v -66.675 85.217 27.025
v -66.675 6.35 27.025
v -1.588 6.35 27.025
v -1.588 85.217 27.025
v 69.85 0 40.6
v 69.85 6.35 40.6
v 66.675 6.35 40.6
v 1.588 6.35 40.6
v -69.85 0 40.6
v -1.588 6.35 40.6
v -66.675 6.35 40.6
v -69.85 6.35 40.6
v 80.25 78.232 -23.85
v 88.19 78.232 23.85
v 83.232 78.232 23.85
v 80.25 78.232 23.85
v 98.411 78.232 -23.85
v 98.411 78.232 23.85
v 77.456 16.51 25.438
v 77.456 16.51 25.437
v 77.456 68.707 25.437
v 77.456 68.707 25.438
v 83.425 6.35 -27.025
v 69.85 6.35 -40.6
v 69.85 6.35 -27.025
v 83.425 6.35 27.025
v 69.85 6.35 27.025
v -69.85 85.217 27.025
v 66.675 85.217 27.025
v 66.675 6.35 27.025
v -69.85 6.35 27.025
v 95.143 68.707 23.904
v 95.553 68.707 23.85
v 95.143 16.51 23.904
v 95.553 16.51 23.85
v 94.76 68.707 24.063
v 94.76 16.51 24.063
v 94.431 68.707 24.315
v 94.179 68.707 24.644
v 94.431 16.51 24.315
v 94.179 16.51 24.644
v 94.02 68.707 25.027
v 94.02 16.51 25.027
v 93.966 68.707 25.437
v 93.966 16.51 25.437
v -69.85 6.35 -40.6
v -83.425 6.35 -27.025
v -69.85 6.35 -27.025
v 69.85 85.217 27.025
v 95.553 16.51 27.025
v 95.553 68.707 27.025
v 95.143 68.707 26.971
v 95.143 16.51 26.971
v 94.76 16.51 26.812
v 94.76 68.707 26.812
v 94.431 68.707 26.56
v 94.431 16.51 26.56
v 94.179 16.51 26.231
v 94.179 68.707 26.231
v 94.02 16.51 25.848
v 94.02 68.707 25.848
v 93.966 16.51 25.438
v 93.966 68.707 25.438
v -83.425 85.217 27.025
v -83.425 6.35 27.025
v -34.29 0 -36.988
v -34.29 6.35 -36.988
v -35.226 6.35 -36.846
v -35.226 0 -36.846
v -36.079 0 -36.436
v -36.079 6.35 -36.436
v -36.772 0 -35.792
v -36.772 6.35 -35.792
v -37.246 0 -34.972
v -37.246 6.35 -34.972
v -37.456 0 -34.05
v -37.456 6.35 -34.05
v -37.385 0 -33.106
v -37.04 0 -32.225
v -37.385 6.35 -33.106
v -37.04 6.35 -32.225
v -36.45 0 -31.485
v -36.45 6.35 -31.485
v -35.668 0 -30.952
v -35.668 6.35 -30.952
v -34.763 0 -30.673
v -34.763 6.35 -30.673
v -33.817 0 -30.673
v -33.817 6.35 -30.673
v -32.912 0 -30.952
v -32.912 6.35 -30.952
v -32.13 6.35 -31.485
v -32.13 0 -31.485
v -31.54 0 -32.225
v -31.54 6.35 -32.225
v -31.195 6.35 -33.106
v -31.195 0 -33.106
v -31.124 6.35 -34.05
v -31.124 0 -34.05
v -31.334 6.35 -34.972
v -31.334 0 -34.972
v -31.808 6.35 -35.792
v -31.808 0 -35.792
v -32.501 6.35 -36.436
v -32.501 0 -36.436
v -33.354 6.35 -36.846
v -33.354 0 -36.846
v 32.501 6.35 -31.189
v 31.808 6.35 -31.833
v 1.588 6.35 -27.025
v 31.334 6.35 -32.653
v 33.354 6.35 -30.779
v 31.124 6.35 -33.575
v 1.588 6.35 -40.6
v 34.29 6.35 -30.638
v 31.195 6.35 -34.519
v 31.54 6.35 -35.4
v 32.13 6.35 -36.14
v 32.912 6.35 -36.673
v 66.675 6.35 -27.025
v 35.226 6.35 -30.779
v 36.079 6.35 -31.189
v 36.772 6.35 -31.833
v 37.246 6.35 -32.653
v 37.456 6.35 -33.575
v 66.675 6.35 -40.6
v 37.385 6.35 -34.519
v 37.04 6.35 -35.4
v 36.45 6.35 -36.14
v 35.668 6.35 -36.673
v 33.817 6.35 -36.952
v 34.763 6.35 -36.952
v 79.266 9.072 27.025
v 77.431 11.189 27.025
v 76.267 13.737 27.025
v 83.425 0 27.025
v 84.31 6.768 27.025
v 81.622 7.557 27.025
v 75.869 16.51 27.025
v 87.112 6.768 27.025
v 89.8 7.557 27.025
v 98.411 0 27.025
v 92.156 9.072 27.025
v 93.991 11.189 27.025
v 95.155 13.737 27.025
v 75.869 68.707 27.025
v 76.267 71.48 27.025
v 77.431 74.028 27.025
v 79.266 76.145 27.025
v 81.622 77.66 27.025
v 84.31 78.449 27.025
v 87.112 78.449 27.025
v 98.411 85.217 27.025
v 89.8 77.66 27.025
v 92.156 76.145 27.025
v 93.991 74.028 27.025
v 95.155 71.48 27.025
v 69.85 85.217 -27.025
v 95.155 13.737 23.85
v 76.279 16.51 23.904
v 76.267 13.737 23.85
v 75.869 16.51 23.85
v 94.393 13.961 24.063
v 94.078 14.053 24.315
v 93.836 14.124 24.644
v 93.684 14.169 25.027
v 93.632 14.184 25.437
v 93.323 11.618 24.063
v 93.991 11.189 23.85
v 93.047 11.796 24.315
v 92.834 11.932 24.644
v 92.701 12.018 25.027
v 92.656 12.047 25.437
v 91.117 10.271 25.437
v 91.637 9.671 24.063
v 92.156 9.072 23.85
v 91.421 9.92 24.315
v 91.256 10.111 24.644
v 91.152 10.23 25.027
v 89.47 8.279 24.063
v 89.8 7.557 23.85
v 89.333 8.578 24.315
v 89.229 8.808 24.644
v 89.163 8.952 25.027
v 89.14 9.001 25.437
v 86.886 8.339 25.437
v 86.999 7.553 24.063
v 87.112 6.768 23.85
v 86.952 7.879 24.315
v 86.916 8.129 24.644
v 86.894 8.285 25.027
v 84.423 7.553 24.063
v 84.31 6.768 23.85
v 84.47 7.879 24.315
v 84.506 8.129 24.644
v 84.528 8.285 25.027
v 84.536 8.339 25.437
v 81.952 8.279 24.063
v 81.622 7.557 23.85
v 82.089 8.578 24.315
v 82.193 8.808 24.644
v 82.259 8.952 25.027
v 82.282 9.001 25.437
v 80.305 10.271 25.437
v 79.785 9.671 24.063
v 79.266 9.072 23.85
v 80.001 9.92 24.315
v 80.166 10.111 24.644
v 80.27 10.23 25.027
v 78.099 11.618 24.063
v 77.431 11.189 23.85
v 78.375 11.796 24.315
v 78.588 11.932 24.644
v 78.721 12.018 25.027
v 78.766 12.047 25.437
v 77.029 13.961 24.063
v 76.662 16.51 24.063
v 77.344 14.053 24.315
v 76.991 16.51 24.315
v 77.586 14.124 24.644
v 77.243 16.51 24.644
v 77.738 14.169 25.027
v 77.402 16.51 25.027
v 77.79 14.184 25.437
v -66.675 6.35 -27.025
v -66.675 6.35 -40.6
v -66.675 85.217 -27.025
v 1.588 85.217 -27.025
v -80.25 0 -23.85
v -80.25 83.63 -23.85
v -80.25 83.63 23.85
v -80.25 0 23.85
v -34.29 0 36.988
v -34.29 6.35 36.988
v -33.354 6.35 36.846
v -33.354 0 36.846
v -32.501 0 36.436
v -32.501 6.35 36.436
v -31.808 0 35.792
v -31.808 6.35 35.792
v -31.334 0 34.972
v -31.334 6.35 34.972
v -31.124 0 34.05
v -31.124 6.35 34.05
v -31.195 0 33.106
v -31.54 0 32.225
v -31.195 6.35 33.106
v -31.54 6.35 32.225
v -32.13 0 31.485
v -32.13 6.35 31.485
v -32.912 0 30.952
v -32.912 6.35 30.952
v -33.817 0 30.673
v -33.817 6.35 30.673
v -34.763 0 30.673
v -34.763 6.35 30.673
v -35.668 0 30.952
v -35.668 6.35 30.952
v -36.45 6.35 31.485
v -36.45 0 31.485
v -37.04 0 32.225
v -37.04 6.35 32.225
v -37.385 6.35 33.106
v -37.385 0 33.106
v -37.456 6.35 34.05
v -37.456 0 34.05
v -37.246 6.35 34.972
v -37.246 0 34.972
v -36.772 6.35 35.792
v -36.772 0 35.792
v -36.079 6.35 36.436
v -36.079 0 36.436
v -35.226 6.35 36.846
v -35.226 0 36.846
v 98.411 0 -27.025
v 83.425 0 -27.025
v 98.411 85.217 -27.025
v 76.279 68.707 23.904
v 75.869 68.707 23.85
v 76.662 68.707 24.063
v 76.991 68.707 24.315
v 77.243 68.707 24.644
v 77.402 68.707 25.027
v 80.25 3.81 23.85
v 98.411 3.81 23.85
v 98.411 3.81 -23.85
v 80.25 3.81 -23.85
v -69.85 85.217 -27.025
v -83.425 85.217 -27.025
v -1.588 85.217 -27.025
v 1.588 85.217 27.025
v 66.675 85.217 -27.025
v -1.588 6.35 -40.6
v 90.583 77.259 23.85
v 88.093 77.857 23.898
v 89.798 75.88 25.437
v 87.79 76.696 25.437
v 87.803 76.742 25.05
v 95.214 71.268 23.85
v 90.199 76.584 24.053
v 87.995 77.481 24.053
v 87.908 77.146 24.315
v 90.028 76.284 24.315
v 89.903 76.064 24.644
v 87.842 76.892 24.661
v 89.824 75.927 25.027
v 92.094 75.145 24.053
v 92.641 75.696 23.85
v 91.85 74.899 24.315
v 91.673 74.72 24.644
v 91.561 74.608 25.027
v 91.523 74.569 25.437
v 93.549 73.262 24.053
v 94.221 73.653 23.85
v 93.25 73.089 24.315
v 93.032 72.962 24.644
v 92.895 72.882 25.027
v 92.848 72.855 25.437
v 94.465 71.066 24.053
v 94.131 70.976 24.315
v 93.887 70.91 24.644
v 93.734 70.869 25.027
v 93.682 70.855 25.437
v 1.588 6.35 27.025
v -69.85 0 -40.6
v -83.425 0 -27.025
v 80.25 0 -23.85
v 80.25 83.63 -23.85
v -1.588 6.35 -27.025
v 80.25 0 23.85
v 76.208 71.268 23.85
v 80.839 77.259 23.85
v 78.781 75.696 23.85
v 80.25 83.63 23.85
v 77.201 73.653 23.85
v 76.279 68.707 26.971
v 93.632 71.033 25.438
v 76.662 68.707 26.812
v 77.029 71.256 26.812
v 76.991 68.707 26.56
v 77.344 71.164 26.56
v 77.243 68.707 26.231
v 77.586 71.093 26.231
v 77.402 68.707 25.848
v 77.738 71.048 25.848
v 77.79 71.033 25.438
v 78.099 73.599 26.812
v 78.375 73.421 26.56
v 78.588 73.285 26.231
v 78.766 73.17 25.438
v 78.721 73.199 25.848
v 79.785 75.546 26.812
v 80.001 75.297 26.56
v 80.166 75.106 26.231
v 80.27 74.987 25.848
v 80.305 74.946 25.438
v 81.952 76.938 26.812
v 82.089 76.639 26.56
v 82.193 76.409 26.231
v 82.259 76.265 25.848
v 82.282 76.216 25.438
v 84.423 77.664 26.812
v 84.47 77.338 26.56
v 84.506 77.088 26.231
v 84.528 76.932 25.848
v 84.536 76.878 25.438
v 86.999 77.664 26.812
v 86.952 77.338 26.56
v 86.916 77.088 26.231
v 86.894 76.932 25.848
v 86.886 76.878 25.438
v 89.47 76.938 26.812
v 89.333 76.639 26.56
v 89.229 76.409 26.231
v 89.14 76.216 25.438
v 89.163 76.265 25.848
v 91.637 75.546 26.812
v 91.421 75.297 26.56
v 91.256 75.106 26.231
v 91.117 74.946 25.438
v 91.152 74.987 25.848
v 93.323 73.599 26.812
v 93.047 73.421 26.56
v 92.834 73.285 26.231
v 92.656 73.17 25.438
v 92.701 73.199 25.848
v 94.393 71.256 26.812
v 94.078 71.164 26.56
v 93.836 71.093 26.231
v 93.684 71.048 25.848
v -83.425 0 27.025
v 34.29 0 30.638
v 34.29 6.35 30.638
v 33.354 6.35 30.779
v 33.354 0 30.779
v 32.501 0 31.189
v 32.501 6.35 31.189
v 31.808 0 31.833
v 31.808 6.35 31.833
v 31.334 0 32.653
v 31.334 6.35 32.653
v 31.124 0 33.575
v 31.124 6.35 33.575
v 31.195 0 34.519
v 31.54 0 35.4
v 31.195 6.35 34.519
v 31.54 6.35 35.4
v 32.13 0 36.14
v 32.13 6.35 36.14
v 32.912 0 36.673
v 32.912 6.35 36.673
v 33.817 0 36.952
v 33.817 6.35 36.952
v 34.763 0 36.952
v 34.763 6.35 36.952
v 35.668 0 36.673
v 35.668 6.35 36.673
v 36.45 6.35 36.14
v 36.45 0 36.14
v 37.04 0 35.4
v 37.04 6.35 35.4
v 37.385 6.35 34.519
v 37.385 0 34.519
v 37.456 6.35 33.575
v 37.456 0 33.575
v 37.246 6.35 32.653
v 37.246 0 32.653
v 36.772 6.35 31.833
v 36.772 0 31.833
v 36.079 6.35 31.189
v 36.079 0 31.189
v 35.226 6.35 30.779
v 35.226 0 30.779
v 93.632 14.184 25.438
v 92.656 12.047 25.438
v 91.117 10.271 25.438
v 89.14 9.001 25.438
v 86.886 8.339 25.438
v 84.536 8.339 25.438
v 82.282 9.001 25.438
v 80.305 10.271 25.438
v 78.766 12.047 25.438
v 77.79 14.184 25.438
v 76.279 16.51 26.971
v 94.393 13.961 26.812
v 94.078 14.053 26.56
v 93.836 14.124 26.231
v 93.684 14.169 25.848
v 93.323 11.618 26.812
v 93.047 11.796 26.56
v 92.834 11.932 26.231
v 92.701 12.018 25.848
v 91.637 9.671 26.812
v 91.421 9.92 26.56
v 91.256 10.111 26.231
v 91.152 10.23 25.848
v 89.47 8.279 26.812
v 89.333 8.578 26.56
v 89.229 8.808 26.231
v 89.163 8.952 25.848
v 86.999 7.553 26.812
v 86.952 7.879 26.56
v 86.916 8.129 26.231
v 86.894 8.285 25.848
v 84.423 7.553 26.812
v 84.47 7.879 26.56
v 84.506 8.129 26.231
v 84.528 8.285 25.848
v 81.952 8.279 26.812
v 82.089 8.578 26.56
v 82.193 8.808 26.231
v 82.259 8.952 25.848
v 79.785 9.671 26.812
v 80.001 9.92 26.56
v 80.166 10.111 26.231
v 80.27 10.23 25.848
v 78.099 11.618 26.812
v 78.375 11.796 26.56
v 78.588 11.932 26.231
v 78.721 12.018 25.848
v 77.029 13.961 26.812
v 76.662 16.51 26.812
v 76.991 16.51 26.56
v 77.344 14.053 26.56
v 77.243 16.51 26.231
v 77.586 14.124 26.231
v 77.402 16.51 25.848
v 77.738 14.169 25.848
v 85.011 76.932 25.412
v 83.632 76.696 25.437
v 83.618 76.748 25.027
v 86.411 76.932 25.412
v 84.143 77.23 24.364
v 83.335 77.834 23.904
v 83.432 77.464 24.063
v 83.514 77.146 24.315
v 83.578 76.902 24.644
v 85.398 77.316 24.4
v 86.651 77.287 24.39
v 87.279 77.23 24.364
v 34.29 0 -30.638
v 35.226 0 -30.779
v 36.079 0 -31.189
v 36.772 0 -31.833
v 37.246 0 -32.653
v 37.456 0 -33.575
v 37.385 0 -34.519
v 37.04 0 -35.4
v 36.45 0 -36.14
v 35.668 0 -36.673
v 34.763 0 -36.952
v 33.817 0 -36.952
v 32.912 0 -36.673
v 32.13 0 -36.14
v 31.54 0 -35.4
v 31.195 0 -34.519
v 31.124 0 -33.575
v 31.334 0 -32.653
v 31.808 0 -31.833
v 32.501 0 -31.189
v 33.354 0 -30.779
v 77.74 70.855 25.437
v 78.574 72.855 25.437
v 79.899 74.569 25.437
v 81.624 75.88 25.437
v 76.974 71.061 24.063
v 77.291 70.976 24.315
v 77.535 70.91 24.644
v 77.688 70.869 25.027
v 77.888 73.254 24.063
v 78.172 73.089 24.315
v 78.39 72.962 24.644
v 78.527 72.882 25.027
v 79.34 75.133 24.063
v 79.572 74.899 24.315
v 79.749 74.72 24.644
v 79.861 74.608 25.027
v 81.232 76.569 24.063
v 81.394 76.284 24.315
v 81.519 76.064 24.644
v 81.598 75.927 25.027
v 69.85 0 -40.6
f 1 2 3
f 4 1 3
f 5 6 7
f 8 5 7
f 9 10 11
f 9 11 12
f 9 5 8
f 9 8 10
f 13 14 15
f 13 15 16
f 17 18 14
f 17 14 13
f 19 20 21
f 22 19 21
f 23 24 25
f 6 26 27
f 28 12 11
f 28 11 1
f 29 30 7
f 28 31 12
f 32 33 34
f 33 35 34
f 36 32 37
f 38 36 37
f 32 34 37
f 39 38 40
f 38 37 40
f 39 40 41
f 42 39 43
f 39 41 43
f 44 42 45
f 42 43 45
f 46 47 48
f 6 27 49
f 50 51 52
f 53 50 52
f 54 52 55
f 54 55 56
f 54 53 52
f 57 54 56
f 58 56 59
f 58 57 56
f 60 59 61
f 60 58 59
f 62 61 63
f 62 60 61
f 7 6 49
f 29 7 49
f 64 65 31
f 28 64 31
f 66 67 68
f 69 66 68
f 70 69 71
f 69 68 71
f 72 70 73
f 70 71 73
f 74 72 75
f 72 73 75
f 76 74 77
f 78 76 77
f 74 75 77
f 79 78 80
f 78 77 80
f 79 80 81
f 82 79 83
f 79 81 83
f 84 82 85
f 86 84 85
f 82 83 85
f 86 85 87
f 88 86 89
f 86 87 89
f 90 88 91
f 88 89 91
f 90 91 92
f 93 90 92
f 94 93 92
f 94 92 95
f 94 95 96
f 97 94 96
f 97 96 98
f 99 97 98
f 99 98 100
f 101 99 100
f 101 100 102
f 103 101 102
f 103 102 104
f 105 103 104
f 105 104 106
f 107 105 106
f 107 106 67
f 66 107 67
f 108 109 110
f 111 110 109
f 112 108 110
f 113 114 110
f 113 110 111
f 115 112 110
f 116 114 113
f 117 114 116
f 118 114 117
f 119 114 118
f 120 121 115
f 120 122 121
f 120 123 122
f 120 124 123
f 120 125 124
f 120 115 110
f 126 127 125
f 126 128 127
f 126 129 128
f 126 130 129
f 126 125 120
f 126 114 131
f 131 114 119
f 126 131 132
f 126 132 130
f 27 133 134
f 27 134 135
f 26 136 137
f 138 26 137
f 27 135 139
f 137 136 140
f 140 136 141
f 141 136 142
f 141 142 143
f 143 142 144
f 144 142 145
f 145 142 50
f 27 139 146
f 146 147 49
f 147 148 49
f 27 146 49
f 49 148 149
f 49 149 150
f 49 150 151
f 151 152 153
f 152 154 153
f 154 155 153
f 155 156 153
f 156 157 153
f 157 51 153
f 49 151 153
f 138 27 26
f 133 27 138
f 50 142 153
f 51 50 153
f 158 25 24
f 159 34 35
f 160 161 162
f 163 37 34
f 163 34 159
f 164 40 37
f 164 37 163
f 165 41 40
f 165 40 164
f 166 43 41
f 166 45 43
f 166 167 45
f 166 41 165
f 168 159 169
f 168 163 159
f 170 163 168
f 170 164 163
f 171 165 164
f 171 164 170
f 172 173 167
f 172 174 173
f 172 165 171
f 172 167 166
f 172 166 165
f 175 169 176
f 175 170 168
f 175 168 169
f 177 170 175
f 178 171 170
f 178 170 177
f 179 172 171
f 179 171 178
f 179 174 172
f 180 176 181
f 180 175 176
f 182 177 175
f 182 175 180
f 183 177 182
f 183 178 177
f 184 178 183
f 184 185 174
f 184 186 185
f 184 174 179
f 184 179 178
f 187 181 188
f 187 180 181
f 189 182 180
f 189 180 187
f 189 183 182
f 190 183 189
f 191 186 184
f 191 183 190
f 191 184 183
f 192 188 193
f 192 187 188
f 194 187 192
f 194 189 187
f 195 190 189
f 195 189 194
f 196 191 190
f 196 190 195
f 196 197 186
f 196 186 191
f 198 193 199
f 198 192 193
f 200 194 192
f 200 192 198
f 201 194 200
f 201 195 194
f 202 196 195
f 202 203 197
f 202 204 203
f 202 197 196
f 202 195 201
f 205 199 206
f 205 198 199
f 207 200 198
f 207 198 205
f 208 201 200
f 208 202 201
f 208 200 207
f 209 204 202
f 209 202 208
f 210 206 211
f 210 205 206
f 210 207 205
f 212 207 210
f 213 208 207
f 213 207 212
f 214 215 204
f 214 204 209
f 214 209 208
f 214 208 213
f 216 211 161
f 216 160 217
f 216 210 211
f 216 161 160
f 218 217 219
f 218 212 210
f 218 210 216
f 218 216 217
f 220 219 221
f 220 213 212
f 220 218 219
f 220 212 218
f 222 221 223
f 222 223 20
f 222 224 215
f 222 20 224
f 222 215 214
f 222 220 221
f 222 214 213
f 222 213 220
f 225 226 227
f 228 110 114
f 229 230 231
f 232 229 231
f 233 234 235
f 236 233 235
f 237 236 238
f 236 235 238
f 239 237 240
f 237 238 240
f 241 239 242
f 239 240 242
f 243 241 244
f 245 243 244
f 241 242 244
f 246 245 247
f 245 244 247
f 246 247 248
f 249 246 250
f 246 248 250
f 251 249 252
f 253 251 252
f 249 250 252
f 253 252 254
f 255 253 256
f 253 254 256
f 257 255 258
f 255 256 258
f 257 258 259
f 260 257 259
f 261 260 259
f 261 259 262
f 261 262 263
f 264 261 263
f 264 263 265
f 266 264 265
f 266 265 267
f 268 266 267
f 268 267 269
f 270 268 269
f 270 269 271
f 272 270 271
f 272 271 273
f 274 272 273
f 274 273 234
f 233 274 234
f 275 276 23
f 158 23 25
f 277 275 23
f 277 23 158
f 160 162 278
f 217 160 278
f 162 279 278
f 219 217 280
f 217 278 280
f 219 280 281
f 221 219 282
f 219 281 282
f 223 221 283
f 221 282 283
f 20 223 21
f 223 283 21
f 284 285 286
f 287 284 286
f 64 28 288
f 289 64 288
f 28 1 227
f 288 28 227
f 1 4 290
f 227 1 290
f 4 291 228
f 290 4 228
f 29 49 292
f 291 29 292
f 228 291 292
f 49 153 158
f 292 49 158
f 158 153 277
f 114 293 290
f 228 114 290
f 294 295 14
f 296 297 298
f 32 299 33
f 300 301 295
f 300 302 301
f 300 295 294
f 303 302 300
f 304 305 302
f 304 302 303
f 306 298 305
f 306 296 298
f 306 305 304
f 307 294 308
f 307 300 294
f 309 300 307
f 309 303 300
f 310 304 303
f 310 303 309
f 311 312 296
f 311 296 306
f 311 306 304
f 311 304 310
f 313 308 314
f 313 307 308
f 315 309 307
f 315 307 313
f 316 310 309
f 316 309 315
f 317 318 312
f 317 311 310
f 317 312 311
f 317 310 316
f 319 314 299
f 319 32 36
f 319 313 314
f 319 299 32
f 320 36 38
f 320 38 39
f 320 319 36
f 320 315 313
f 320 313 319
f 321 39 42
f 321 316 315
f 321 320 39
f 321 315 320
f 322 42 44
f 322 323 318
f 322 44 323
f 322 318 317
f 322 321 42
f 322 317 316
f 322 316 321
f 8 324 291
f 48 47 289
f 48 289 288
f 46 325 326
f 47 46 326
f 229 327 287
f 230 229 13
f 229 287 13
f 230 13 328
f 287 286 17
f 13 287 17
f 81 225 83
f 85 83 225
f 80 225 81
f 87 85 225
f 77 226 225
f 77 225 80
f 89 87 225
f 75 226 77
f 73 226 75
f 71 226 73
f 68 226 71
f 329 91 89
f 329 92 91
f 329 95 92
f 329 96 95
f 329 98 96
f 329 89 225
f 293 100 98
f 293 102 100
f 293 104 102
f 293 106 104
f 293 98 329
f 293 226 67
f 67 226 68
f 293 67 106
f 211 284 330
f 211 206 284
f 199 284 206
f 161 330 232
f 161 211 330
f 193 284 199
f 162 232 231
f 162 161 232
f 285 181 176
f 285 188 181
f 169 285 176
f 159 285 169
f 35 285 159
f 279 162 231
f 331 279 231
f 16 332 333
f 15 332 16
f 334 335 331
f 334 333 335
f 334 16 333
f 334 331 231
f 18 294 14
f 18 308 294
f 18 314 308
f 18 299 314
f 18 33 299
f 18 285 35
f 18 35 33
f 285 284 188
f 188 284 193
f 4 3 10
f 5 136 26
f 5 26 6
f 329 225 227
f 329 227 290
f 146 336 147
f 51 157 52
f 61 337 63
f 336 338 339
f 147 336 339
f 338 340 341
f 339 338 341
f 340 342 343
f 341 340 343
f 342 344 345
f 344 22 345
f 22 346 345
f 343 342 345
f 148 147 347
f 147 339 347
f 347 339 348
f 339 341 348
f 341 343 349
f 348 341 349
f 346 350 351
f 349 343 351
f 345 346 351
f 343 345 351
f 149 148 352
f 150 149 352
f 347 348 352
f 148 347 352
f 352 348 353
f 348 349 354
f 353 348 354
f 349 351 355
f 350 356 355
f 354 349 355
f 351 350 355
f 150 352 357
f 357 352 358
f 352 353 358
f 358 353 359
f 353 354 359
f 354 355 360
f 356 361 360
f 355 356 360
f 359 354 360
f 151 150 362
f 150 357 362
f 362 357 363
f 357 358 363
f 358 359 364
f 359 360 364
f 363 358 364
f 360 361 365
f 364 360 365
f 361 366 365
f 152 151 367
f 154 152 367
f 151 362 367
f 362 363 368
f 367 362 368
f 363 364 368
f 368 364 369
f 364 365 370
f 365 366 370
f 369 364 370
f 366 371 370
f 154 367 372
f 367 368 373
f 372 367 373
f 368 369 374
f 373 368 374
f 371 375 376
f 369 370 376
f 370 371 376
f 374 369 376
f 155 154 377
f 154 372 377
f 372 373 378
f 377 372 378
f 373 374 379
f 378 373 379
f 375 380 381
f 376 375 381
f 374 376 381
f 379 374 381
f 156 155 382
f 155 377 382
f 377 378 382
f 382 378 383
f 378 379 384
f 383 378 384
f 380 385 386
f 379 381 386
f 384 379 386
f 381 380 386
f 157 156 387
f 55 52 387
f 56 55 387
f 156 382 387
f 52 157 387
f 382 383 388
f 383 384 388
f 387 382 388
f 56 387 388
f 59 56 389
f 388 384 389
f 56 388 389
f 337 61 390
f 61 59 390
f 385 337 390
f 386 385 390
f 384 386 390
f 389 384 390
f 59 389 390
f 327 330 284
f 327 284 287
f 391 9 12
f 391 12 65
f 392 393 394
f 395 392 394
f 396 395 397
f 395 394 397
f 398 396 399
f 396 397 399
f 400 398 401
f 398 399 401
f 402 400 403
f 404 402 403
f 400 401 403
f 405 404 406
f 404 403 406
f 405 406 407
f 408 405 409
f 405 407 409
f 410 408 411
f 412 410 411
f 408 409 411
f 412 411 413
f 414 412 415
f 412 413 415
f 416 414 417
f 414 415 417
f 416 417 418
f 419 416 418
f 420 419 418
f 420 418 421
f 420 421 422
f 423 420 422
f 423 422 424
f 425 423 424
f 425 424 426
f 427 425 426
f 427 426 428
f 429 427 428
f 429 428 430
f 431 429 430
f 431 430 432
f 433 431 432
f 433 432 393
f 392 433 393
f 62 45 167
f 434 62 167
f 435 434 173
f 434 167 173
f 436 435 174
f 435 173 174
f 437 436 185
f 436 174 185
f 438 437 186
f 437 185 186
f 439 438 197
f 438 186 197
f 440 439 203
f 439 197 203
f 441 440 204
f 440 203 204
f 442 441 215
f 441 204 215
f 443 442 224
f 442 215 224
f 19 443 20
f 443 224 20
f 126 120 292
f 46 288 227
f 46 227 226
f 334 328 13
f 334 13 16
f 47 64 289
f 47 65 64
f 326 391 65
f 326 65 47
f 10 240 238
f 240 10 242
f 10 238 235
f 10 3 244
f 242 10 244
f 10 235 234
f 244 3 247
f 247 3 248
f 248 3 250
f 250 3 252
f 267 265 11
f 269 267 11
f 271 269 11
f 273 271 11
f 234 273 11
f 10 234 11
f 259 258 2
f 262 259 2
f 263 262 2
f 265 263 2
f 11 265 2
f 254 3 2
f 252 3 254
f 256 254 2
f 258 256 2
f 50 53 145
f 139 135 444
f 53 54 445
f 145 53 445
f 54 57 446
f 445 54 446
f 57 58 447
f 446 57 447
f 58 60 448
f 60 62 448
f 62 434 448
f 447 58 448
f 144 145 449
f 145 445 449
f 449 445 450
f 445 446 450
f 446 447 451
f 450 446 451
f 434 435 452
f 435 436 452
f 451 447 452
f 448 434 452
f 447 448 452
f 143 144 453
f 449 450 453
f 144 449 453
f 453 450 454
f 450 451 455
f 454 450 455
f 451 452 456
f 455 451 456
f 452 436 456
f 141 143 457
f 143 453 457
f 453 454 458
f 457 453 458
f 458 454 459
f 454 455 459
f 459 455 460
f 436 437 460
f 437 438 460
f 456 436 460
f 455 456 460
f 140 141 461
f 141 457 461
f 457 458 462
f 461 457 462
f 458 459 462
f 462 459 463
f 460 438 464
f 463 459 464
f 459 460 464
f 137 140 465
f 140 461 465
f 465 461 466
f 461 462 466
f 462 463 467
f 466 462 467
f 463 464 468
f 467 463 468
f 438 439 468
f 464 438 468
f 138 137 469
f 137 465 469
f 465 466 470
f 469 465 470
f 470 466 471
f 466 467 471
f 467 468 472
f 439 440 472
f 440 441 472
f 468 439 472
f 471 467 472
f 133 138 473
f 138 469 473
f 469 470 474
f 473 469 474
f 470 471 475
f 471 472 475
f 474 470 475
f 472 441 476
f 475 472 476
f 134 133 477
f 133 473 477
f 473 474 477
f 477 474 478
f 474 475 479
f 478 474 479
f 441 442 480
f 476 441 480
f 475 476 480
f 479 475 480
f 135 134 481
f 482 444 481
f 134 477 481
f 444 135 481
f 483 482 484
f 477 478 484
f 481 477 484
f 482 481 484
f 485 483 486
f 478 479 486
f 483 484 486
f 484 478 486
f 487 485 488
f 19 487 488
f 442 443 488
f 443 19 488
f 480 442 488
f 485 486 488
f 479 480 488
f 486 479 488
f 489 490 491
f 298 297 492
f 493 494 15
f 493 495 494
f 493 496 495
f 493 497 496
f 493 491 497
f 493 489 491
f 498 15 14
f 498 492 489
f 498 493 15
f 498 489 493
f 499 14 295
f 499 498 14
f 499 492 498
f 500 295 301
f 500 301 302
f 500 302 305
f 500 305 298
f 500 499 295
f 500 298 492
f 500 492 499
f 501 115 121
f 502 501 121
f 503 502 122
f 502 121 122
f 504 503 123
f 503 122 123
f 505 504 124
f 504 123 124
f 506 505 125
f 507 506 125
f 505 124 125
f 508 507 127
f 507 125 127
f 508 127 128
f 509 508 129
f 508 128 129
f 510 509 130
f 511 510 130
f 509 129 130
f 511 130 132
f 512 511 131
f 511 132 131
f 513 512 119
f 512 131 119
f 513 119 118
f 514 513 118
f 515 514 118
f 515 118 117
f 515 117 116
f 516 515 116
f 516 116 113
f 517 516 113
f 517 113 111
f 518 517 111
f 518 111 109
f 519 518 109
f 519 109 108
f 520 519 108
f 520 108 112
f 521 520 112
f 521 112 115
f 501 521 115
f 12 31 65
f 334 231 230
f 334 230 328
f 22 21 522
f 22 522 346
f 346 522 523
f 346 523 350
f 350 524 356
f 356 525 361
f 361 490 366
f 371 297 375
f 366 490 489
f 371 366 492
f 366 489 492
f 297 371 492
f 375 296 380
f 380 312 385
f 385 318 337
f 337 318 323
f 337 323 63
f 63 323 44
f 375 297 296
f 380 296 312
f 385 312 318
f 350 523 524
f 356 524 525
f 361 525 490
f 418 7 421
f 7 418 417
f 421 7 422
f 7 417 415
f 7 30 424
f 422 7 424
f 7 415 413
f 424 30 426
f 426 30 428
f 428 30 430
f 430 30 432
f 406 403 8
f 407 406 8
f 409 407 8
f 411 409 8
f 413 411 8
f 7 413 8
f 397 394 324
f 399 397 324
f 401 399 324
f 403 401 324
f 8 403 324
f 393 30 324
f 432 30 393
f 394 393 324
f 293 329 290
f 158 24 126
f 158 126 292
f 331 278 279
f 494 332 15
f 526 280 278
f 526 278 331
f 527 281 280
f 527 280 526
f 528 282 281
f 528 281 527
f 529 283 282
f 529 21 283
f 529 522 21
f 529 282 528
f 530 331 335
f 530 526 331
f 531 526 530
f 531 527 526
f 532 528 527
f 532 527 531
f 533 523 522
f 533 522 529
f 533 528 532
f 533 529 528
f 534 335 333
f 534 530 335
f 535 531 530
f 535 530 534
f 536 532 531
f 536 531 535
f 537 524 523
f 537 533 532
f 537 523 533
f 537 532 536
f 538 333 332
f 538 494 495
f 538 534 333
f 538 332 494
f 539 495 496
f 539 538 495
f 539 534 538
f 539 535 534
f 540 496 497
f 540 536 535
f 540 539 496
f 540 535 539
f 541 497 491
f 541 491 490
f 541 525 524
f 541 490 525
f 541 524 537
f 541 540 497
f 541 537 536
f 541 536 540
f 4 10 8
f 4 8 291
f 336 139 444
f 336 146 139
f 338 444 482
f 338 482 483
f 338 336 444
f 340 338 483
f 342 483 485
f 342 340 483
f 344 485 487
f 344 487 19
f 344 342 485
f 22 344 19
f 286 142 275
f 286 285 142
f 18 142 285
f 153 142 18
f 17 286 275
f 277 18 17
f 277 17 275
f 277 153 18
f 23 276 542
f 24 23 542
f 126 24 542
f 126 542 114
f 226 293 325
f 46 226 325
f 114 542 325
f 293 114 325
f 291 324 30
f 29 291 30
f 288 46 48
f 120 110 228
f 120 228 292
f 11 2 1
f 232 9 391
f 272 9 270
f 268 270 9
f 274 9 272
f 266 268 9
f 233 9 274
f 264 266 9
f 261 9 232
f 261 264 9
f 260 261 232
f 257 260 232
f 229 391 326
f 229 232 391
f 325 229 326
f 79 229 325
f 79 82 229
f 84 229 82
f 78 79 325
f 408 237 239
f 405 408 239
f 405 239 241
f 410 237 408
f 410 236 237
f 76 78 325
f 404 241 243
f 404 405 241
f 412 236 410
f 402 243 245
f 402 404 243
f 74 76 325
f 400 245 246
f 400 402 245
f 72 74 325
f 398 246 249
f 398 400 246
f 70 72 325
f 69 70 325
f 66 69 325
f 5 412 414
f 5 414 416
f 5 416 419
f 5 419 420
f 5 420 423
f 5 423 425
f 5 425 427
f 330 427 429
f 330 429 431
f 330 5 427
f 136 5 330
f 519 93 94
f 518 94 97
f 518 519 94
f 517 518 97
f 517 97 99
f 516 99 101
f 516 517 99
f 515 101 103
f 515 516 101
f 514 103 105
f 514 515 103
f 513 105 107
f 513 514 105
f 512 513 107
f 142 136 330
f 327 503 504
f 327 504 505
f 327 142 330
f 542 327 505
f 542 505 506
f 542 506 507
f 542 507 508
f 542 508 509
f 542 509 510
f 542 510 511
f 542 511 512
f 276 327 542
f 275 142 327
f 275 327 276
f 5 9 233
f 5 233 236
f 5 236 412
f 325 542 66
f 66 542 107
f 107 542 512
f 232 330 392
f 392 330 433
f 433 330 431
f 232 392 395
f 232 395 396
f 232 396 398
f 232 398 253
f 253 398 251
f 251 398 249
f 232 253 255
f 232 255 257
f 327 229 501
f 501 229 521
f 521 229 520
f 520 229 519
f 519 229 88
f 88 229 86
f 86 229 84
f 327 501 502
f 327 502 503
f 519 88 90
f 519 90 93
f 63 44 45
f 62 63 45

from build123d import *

# Parameters (mm, degrees)
SKETCH1_W                 = 166.85
SKETCH1_H                 = 54.05
SKETCH1_W_2               = 160.5
SKETCH1_H_2               = 47.7
BOSS_EXTRUDE1_DEPTH       = 3.81
BOSS_EXTRUDE2_DEPTH       = 78.232
SKETCH3_W                 = 166.85
SKETCH3_H                 = 54.05
BOSS_EXTRUDE5_DEPTH       = 3.175
SKETCH4_W                 = 3.175
SKETCH4_H                 = 54.05
BOSS_EXTRUDE6_DEPTH       = 3.81
BOSS_EXTRUDE7_DEPTH       = 6.35
BOSS_EXTRUDE9_DEPTH       = 3.175
BOSS_EXTRUDE10_DEPTH      = 3.175
SKETCH8_R                 = 3.175
CUT_EXTRUDE1_DEPTH        = 122.77066278
BOSS_EXTRUDE11_DEPTH      = 1.5875
BOSS_EXTRUDE11_DEPTH_BACK = 1.5875
SKETCH14_W                = 54.05
SKETCH14_H                = 85.217
SKETCH14_W_2              = 47.7
SKETCH14_H_2              = 74.422
BOSS_EXTRUDE13_DEPTH      = 14.986
CUT_EXTRUDE2_DEPTH        = 147.696293869
SKETCH16_W                = 160.5
SKETCH16_H                = 47.7
CUT_EXTRUDE3_DEPTH        = 1.5875
SKETCH17_W                = 18.712657602
SKETCH17_H                = 69.277031054
BOSS_EXTRUDE14_DEPTH      = 3.175
FILLET1_R                 = 1.5875


with BuildPart() as part:
    # Sketch1 → Boss-Extrude1 (new body)
    with BuildSketch(Plane(origin=(0, 0, 0), x_dir=(1, 0, 0), z_dir=(0, 1, 0))):
        Rectangle(SKETCH1_W, SKETCH1_H)
        Rectangle(SKETCH1_W_2, SKETCH1_H_2, mode=Mode.SUBTRACT)
    extrude(amount=BOSS_EXTRUDE1_DEPTH)

    # Sketch2 → Boss-Extrude2 (add)
    with BuildSketch(Plane(origin=(0, 3.81, 0), x_dir=(1, 0, 0), z_dir=(0, 1, 0))):
        Polygon((-83.425, 27.025), (83.425, 27.025), (83.425, 23.85), (80.25, 23.85), (-80.25, 23.85), (-80.25, -23.85), (80.25, -23.85), (83.425, -23.85), (83.425, -27.025), (-83.425, -27.025), align=None)
    extrude(amount=BOSS_EXTRUDE2_DEPTH)

    # Sketch3 → Boss-Extrude5 (add)
    with BuildSketch(Plane(origin=(0, 82.042, 0), x_dir=(1, 0, 0), z_dir=(0, 1, 0))):
        Rectangle(SKETCH3_W, SKETCH3_H)
    extrude(amount=BOSS_EXTRUDE5_DEPTH)

    # Sketch4 → Boss-Extrude6 (add)
    with BuildSketch(Plane.XZ.offset(-82.042)):
        with Locations((81.8375, 0)):
            Rectangle(SKETCH4_W, SKETCH4_H)
    extrude(amount=BOSS_EXTRUDE6_DEPTH)

    # Sketch5 → Boss-Extrude7 (add)
    with BuildSketch(Plane(origin=(0, 0, 0), x_dir=(1, 0, 0), z_dir=(0, 1, 0))):
        Polygon((-83.425, -27.025), (83.425, -27.025), (69.85, -40.6), (-69.85, -40.6), align=None)
        Polygon((-69.85, 40.6), (-83.425, 27.025), (83.425, 27.025), (69.85, 40.6), align=None)
    extrude(amount=BOSS_EXTRUDE7_DEPTH)

    # Sketch6 → Boss-Extrude9 (add)
    with BuildSketch(Plane.ZY.offset(69.85)):
        Polygon((27.025, 85.217), (27.025, 6.35), (40.6, 6.35), align=None)
        Polygon((-27.025, 85.217), (-40.6, 6.35), (-27.025, 6.35), align=None)
    extrude(amount=-BOSS_EXTRUDE9_DEPTH)

    # Sketch7 → Boss-Extrude10 (add)
    with BuildSketch(Plane(origin=(69.85, 0, 0), x_dir=(0, 0, -1), z_dir=(1, 0, 0))):
        Polygon((-27.025, 85.217), (-27.025, 6.35), (-40.6, 6.35), align=None)
        Polygon((40.6, 6.35), (27.025, 85.217), (27.025, 6.35), align=None)
    extrude(amount=-BOSS_EXTRUDE10_DEPTH)

    # Sketch8 → Cut-Extrude1 (cut, through all)
    with BuildSketch(Plane(origin=(0, 6.35, 0), x_dir=(1, 0, 0), z_dir=(0, 1, 0))):
        with Locations(Location((-34.29, -33.812500014, 0), (0, 0, 270))):
            Circle(SKETCH8_R)
        with Locations(Location((34.29, -33.812500014, 0), (0, 0, 90))):
            Circle(SKETCH8_R)
        with Locations(Location((34.29, 33.812500014, 0), (0, 0, 270))):
            Circle(SKETCH8_R)
        with Locations(Location((-34.29, 33.812500014, 0), (0, 0, 90))):
            Circle(SKETCH8_R)
    extrude(amount=-CUT_EXTRUDE1_DEPTH, mode=Mode.SUBTRACT)

    # Sketch11 → Boss-Extrude11 (add, two sides: drawn at the far end of the back side and taken through both)
    with BuildSketch(Plane(origin=(0, 0, 0), x_dir=(0, 0, -1), z_dir=(1, 0, 0)).offset(-BOSS_EXTRUDE11_DEPTH_BACK)):
        Polygon((-27.025, 85.217), (-27.025, 6.35), (-40.6, 6.35), align=None)
        Polygon((40.6, 6.35), (27.025, 85.217), (27.025, 6.35), align=None)
    extrude(amount=BOSS_EXTRUDE11_DEPTH + BOSS_EXTRUDE11_DEPTH_BACK)

    # Sketch14 → Boss-Extrude13 (add)
    with BuildSketch(Plane(origin=(98.411, 0, 0), x_dir=(0, 0, -1), z_dir=(1, 0, 0))):
        with Locations((0, 42.6085)):
            Rectangle(SKETCH14_W, SKETCH14_H)
        with Locations((0, 41.021)):
            Rectangle(SKETCH14_W_2, SKETCH14_H_2, mode=Mode.SUBTRACT)
    extrude(amount=-BOSS_EXTRUDE13_DEPTH)

    # Sketch15 → Cut-Extrude2 (cut, through all)
    with BuildSketch(Plane(origin=(0, 0, -27.025), x_dir=(-1, 0, 0), z_dir=(0, 0, -1))):
        with BuildLine():
            Line((-93.966, 68.707), (-93.966, 16.51))
            ThreePointArc((-93.966, 16.51), (-85.711, 8.255), (-77.456, 16.51))
            Line((-77.456, 16.51), (-77.456, 68.707))
            ThreePointArc((-77.456, 68.707), (-85.711, 76.962), (-93.966, 68.707))
        make_face()
    extrude(amount=-CUT_EXTRUDE2_DEPTH, mode=Mode.SUBTRACT)

    # Sketch16 → Cut-Extrude3 (cut)
    with BuildSketch(Plane.XZ.offset(-82.042)):
        Rectangle(SKETCH16_W, SKETCH16_H)
    extrude(amount=-CUT_EXTRUDE3_DEPTH, mode=Mode.SUBTRACT)

    # Sketch17 → Boss-Extrude14 (add)
    with BuildSketch(Plane(origin=(0, 0, -27.025), x_dir=(-1, 0, 0), z_dir=(0, 0, -1))):
        with Locations((-85.711, 42.6085)):
            Rectangle(SKETCH17_W, SKETCH17_H)
    extrude(amount=-BOSS_EXTRUDE14_DEPTH)

    # Fillet1
    fillet1_edges = [part.edges().sort_by_distance(p)[0] for p in [
        (85.711, 8.255, 23.85),
        (93.966, 42.6085, 23.85),
        (85.711, 76.962, 23.85),
        (85.711, 76.962, 27.025),
        (77.456, 42.6085, 27.025),
        (85.711, 8.255, 27.025),
        (77.456, 42.6085, 23.85),
        (93.966, 42.6085, 27.025),
    ]]
    fillet(fillet1_edges, radius=FILLET1_R - 0.0001)  # a hair under: the kernel refuses the full size


solid = part.part
